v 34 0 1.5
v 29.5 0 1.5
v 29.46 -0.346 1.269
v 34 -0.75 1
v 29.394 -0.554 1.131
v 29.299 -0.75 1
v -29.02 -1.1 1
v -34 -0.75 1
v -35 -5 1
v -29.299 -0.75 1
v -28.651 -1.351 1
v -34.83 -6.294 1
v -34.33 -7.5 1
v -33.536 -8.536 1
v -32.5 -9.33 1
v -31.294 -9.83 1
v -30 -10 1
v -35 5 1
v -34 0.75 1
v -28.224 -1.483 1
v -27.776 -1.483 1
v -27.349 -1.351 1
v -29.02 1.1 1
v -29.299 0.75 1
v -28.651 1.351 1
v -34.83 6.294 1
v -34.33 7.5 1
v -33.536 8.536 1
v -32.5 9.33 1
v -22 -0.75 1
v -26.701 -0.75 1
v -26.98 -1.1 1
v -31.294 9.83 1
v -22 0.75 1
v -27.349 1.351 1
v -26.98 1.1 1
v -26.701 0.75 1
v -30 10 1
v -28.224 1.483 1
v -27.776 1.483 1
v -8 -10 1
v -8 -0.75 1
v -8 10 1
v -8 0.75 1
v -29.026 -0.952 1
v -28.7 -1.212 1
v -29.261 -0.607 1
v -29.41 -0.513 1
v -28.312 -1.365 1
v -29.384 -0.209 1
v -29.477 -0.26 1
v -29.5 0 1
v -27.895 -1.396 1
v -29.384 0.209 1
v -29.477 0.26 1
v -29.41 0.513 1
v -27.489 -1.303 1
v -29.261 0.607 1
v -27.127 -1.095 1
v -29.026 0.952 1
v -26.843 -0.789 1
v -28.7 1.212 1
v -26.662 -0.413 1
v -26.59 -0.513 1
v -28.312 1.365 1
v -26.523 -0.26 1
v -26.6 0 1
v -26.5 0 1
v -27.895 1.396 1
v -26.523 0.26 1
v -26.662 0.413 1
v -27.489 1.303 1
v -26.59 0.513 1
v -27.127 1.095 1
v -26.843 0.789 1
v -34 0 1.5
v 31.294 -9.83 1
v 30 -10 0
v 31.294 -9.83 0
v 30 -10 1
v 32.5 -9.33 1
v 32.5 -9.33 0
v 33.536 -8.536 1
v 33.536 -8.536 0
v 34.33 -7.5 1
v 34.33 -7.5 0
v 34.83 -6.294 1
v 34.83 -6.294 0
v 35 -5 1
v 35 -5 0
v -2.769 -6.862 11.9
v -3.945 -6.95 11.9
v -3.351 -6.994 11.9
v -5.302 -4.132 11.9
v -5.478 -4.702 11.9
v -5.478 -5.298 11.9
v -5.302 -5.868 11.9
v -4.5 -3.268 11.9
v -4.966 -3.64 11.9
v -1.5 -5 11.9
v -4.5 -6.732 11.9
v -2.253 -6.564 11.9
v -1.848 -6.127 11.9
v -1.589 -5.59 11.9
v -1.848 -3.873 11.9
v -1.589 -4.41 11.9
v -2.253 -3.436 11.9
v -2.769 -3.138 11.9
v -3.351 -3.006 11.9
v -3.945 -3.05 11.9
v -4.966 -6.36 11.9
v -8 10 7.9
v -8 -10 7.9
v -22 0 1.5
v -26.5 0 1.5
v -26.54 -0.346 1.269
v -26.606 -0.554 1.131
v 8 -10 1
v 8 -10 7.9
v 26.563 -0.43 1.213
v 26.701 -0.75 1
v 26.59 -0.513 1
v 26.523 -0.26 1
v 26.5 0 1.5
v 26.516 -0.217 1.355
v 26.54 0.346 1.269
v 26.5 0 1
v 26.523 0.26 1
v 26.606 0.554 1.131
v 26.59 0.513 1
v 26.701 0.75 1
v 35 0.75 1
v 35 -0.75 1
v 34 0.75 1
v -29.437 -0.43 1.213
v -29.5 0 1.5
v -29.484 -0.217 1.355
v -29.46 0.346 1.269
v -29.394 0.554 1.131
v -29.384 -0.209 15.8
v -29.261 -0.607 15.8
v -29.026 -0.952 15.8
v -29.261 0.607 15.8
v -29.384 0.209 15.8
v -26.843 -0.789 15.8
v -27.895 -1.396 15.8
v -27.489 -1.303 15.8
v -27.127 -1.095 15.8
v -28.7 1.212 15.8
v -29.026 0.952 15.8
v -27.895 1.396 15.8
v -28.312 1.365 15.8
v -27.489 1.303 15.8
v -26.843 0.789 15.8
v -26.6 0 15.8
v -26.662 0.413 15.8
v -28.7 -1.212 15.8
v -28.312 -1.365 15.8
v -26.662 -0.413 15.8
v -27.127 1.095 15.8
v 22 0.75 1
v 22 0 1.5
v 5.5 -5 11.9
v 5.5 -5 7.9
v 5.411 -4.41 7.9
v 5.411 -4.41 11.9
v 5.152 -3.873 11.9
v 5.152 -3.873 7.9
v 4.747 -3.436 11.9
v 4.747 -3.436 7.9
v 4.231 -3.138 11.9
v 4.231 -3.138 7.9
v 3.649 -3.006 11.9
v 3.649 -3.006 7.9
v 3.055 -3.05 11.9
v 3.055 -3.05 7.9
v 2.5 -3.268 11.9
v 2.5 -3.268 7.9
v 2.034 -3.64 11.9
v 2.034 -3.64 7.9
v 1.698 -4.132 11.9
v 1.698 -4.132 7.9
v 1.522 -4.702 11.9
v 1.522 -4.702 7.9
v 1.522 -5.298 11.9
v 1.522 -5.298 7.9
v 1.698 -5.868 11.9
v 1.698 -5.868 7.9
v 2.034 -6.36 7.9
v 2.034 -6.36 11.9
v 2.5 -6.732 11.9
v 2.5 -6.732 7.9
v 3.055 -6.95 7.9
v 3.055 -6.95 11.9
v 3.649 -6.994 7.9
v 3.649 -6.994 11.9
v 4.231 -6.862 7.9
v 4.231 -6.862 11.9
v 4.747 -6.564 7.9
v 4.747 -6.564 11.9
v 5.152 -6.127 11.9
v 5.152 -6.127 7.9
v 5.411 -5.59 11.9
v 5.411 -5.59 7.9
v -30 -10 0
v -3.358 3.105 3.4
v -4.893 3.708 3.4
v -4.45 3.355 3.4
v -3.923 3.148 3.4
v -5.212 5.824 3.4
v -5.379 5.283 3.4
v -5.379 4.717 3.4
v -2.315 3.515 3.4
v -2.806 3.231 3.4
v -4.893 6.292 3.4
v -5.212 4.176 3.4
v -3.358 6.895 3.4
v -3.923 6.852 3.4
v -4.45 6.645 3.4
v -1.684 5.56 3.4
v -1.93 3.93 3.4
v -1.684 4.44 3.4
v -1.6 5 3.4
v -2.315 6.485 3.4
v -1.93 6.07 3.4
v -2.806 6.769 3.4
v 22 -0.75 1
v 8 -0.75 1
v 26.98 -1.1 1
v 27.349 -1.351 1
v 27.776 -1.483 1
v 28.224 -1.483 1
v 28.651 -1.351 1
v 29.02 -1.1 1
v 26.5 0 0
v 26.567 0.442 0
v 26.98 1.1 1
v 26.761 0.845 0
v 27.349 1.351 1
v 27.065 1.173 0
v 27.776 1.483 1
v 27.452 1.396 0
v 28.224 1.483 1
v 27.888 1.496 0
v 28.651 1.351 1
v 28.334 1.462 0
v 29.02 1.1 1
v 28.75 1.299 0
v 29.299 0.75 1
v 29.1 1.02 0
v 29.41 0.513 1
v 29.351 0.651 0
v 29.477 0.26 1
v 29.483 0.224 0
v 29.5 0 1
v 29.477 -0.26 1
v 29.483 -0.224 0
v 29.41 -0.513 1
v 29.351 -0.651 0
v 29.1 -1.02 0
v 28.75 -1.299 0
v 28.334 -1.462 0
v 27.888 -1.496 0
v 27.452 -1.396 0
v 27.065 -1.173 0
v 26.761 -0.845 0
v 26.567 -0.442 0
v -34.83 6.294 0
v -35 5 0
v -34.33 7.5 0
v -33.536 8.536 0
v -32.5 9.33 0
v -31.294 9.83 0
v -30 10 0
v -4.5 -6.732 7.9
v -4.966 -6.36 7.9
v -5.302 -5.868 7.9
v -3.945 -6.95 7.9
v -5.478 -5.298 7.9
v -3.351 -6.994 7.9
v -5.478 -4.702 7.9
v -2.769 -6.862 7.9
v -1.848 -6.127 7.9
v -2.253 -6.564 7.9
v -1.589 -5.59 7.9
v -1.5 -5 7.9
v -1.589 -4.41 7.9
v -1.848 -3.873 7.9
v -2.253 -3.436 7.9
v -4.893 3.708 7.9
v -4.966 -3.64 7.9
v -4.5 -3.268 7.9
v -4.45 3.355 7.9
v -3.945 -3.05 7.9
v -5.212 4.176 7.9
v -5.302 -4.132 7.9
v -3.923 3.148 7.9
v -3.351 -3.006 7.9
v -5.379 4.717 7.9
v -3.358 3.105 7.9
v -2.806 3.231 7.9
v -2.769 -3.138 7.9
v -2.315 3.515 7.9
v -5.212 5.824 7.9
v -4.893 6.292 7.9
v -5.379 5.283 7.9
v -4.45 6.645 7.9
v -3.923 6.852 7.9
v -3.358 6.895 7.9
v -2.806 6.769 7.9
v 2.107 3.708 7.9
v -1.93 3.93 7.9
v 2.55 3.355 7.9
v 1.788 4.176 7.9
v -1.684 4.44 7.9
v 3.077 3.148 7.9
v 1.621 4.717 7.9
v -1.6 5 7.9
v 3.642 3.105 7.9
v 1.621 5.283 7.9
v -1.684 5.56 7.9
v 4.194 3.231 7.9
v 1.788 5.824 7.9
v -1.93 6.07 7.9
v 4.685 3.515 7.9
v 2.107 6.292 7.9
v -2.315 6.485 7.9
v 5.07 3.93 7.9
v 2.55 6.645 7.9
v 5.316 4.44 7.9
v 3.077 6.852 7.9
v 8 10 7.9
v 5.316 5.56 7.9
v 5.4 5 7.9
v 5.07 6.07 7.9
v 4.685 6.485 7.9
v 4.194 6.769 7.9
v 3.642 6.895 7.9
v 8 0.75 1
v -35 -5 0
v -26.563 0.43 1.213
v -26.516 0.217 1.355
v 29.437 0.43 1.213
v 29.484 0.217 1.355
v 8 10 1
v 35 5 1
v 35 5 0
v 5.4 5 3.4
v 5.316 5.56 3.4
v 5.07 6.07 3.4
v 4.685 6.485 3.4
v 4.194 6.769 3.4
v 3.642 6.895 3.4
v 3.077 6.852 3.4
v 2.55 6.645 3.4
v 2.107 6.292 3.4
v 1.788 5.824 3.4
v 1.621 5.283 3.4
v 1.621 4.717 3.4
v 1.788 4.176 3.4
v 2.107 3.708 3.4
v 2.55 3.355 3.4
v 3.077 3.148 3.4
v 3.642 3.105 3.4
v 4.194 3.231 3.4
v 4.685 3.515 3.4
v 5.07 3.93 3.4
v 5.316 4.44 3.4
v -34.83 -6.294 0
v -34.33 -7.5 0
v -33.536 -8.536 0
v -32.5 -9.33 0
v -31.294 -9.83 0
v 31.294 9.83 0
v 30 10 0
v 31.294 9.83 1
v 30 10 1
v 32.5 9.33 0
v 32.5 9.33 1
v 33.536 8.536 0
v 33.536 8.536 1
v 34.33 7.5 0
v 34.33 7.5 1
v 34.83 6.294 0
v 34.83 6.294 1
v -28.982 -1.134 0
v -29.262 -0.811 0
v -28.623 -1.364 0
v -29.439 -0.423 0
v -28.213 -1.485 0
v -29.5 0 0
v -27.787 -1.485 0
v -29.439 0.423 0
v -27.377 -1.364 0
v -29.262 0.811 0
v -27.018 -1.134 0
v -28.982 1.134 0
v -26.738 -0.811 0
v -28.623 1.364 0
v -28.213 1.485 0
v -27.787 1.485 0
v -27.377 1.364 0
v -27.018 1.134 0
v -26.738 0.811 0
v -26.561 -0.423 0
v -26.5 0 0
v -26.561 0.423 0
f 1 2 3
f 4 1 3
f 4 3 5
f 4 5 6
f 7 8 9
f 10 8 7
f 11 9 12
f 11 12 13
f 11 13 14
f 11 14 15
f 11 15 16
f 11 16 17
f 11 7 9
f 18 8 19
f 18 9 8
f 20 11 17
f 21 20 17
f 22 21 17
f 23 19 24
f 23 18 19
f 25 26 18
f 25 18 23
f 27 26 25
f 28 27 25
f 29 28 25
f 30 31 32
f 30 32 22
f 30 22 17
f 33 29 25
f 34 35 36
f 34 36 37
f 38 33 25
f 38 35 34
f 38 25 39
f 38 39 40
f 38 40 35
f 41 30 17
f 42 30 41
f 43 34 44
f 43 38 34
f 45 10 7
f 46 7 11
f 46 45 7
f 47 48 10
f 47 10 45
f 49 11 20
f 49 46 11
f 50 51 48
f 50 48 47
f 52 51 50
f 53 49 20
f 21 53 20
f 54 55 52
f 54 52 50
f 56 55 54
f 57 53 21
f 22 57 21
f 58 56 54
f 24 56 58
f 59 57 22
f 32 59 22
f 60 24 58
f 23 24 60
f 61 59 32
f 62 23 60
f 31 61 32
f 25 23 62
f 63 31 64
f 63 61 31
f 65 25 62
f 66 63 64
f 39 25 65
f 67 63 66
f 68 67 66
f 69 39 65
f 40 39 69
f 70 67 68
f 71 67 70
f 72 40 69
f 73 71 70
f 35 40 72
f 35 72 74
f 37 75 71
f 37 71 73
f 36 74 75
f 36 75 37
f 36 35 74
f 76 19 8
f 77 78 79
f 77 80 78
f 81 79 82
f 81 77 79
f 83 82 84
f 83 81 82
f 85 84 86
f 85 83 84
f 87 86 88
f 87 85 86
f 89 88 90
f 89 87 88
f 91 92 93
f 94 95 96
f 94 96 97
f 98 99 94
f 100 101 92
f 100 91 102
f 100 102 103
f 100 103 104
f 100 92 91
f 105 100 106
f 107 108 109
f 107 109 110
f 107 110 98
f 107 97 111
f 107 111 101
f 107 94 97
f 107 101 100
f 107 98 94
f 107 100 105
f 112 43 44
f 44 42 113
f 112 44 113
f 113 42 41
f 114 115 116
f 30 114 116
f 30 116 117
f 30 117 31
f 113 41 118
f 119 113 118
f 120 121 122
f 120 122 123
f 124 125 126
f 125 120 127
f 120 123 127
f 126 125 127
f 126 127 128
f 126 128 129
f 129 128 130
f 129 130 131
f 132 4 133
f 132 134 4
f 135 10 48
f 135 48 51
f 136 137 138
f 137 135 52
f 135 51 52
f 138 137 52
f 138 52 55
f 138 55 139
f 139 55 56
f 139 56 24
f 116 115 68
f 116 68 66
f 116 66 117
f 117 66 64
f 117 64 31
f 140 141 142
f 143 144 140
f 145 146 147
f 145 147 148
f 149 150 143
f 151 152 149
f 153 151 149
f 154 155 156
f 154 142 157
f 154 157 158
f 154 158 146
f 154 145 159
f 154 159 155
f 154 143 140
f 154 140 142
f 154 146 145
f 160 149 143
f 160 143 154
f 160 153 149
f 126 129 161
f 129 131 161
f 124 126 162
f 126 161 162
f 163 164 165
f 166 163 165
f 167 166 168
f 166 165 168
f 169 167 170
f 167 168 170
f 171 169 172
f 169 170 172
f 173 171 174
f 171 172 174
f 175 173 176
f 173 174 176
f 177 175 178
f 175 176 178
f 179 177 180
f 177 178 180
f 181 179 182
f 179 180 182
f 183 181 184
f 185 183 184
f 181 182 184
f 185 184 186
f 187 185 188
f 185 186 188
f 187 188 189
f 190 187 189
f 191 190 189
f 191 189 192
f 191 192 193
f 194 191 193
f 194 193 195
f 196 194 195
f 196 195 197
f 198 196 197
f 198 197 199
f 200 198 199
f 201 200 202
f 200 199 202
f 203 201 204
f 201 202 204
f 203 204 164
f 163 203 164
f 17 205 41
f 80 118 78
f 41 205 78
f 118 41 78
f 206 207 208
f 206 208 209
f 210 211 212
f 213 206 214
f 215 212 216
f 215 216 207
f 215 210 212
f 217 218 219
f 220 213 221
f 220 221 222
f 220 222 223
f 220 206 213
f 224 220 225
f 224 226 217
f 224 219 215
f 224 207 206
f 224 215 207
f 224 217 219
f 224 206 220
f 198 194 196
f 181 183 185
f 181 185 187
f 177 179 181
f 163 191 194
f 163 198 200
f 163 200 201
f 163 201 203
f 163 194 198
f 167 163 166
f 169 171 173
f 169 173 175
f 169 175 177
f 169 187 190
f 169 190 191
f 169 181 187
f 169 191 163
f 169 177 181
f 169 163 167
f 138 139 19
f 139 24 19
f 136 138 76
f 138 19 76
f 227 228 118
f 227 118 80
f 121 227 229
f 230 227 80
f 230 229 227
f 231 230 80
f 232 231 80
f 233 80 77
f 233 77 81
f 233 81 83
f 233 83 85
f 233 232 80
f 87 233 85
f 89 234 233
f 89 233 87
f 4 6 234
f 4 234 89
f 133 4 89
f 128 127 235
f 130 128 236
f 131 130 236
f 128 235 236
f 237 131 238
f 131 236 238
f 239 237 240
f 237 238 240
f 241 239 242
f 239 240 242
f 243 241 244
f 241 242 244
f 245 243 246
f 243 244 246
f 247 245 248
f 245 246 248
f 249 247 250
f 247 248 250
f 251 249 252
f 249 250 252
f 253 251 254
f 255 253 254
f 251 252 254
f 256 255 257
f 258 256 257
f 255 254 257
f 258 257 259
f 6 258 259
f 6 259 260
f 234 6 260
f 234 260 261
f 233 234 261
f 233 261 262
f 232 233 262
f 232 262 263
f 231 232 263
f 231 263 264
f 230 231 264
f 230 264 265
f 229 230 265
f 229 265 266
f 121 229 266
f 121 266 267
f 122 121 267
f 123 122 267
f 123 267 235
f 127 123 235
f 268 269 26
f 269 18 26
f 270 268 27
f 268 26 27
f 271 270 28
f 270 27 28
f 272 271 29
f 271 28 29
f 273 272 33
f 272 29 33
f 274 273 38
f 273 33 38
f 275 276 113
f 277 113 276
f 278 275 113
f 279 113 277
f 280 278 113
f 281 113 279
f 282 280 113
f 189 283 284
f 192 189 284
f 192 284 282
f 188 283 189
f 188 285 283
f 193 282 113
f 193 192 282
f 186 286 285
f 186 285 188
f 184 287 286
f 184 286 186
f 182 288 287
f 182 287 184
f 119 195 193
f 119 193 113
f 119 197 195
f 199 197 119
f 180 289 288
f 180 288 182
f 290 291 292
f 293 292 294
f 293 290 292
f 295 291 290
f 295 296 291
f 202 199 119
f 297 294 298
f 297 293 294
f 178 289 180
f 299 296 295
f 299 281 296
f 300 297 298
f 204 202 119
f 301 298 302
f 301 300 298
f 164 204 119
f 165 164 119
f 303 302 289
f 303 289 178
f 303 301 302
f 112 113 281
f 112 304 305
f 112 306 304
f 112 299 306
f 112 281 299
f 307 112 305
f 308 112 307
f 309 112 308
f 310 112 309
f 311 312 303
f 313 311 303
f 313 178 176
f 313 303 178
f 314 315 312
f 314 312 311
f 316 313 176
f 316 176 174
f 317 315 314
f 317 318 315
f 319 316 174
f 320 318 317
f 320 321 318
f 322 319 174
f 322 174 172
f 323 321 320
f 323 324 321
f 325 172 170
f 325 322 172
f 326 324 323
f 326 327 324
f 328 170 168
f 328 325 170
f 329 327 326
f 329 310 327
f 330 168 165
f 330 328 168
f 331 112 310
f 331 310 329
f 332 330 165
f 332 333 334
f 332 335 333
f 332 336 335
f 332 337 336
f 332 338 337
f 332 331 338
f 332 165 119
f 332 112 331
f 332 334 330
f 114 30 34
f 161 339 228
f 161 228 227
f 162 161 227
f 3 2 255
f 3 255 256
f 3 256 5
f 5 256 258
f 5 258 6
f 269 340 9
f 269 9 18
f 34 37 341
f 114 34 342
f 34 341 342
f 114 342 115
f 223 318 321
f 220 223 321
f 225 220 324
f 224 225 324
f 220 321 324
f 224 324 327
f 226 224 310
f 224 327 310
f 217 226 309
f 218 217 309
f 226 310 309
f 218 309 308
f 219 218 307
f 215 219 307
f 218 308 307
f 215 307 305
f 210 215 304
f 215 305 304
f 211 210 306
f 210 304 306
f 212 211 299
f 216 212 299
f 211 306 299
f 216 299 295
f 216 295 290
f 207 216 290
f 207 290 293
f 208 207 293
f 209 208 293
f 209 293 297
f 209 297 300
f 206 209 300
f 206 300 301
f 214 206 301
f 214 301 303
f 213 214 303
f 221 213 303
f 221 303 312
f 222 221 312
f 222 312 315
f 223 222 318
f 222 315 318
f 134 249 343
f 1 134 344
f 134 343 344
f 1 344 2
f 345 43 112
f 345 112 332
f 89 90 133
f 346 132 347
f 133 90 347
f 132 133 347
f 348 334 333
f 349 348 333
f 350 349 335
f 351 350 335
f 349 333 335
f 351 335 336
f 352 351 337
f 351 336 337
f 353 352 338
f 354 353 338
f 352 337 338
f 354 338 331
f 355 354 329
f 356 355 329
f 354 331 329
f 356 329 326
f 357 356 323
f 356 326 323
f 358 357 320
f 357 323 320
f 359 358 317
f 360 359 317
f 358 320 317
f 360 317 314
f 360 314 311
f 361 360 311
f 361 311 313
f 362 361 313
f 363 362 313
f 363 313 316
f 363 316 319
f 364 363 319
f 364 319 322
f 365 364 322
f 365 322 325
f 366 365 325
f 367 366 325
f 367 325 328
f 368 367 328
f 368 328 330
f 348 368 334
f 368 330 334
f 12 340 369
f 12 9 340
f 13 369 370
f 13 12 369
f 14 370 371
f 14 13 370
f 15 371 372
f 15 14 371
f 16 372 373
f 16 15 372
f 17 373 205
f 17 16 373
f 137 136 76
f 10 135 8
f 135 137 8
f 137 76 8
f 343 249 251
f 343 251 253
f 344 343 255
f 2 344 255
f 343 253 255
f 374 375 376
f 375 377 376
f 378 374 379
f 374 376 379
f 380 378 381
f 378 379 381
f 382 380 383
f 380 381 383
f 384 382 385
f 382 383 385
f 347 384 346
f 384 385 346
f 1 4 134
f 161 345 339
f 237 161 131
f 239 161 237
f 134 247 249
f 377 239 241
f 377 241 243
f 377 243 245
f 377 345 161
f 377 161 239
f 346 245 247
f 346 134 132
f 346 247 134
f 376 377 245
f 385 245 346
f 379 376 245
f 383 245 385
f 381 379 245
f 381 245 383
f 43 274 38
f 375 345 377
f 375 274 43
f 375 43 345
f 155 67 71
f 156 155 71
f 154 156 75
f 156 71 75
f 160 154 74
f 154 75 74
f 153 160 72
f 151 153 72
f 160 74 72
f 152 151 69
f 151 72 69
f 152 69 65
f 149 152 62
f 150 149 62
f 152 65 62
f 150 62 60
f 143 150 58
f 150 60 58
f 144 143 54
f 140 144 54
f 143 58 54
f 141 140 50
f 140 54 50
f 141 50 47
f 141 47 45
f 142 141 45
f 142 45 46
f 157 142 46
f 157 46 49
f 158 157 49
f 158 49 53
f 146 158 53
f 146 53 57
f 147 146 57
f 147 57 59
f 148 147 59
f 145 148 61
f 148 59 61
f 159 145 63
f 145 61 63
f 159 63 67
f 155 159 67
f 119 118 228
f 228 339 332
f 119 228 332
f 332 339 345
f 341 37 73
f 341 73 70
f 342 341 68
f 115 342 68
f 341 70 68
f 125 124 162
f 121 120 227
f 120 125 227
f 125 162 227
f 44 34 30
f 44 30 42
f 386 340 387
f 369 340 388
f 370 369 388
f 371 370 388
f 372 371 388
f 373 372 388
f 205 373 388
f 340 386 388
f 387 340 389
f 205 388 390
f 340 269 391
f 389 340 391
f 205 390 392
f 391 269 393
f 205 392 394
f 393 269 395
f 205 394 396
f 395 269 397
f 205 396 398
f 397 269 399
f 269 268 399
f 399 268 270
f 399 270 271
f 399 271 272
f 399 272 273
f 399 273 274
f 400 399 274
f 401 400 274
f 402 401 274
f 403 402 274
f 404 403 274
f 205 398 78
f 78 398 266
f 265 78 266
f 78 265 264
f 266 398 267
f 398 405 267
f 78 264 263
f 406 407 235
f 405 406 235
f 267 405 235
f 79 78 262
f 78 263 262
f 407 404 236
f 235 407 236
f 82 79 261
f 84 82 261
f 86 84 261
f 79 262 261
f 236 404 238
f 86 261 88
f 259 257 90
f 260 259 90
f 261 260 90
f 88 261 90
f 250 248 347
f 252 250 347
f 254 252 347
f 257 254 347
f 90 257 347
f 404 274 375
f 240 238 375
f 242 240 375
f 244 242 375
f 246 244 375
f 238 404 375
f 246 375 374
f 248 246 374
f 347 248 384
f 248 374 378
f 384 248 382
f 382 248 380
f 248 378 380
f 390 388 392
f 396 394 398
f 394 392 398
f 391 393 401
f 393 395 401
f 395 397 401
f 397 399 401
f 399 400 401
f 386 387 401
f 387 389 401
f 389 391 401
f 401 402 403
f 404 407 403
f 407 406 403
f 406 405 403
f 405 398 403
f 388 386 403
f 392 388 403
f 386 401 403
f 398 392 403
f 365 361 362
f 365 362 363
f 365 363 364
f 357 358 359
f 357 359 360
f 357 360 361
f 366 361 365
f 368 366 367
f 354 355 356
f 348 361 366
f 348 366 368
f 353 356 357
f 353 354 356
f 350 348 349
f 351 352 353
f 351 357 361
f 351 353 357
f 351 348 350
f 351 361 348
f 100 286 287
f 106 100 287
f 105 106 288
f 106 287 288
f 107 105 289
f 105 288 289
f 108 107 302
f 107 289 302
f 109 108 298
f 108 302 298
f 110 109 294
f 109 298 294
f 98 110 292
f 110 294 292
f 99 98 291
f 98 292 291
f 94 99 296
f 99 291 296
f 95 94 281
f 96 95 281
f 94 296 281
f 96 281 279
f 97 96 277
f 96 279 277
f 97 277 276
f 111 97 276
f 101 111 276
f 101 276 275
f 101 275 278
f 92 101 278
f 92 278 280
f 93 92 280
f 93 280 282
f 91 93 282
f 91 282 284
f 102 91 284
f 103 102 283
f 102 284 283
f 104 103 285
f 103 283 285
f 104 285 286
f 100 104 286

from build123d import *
from build123d import SkipClean  # not in build123d's __all__

# Parameters (mm, degrees)
F0_W      = 70
F0_H      = 20
F1_DEPTH  = 1
F3_D      = 3
F4_R      = 5
F7_DEPTH  = 0.5
F9_DEPTH  = 69.001
F10_W     = 16
F10_H     = 9.25
F10_H_2   = 1.5
F11_DEPTH = 6.9
F12_R     = 1.9
F13_DEPTH = 4.5
F14_R     = 2
F15_DEPTH = 4
F16_R     = 1.5
F17_DEPTH = 1
F18_R     = 1.4
F19_DEPTH = 14.8


with BuildPart() as f1:
    # F0 (on Top) → F1 (new body)
    with BuildSketch(Plane.XY):
        Rectangle(F0_W, F0_H)
    extrude(amount=F1_DEPTH)

    # F3 (through all)
    with Locations(Plane.XY.offset(1)):
        with Locations((-28, 0), (28, 0)):
            Hole(F3_D / 2)

    # F4
    f4_edges = [f1.edges().sort_by_distance(p)[0] for p in [
        (-35, 10, 0.5),
        (-35, -10, 0.5),
        (35, 10, 0.5),
        (35, -10, 0.5),
    ]]
    fillet(f4_edges, radius=F4_R)

    # F5 (on face) + F6 (on face) → F7 (join)
    with BuildSketch(Plane.XY.offset(1)):
        with BuildLine():
            Line((-29.2990381057, 0.75), (-34, 0.75))
            Line((-34, 0.75), (-34, -0.75))
            Line((-34, -0.75), (-29.2990381057, -0.75))
            ThreePointArc((-29.2990381057, -0.75), (-29.5, 0), (-29.2990381057, 0.75))
        make_face()
        with BuildLine():
            Line((-22, 0.75), (-26.7009618943, 0.75))
            ThreePointArc((-26.7009618943, 0.75), (-26.5511112606, 0.3882285677), (-26.5, 0))
            ThreePointArc((-26.5, 0), (-26.5511112606, -0.3882285677), (-26.7009618943, -0.75))
            Line((-26.7009618943, -0.75), (-22, -0.75))
            Line((-22, -0.75), (-22, 0.75))
        make_face()
    with BuildSketch(Plane.XY.offset(1)):
        with BuildLine():
            Line((26.7009618943, 0.75), (22, 0.75))
            Line((22, 0.75), (22, -0.75))
            Line((22, -0.75), (26.7009618943, -0.75))
            ThreePointArc((26.7009618943, -0.75), (26.5, 0), (26.7009618943, 0.75))
        make_face()
        with BuildLine():
            Line((34, 0.75), (29.2990381057, 0.75))
            ThreePointArc((29.2990381057, 0.75), (29.4488887394, 0.3882285677), (29.5, 0))
            ThreePointArc((29.5, 0), (29.4488887394, -0.3882285677), (29.2990381057, -0.75))
            Line((29.2990381057, -0.75), (34, -0.75))
            Line((34, -0.75), (34, 0.75))
        make_face()
    with SkipClean():  # cleaning this boolean's faces spoils the solid; the shape is the same uncleaned
        extrude(amount=F7_DEPTH)

    # F8 (on face) → F9 (cut, through all)
    with BuildSketch(Plane(origin=(-34, 0, 0), x_dir=(0, -1, 0), z_dir=(-1, 0, 0))):
        Polygon((-0.75, 1.5), (-0.75, 1), (0, 1.5), align=None)
        Polygon((0.75, 1.5), (0, 1.5), (0.75, 1), align=None)
    with SkipClean():  # cleaning this boolean's faces spoils the solid; the shape is the same uncleaned
        extrude(amount=-F9_DEPTH, mode=Mode.SUBTRACT)

    # F10 (on face) → F11 (join)
    with BuildSketch(Plane.XY.offset(1)):
        with Locations((0, -5.375)):
            Rectangle(F10_W, F10_H)
        Rectangle(F10_W, F10_H_2)
        with Locations((0, 5.375)):
            Rectangle(F10_W, F10_H)
    with SkipClean():  # cleaning this boolean's faces spoils the solid; the shape is the same uncleaned
        extrude(amount=F11_DEPTH)

    # F12 (on face) → F13 (cut)
    with BuildSketch(Plane.XY.offset(7.9)):
        with Locations((-3.5, 5)):
            Circle(F12_R)
        with Locations((3.5, 5)):
            Circle(F12_R)
    with SkipClean():  # cleaning this boolean's faces spoils the solid; the shape is the same uncleaned
        extrude(amount=-F13_DEPTH, mode=Mode.SUBTRACT)

    # F14 (on face) → F15 (join)
    with BuildSketch(Plane.XY.offset(7.9)):
        with Locations((-3.5, -5)):
            Circle(F14_R)
        with Locations((3.5, -5)):
            Circle(F14_R)
    with SkipClean():  # cleaning this boolean's faces spoils the solid; the shape is the same uncleaned
        extrude(amount=F15_DEPTH)

    # F16 (on face) → F17 (join)
    with BuildSketch(Plane.XY.offset(1)):
        with Locations((-28, 0)):
            Circle(F16_R)
    with SkipClean():  # cleaning this boolean's faces spoils the solid; the shape is the same uncleaned
        extrude(amount=-F17_DEPTH)

    # F18 (on face) → F19 (join)
    with BuildSketch(Plane.XY.offset(1)):
        with Locations((-28, 0)):
            Circle(F18_R)
    with SkipClean():  # cleaning this boolean's faces spoils the solid; the shape is the same uncleaned
        extrude(amount=F19_DEPTH)


solid = f1.part
